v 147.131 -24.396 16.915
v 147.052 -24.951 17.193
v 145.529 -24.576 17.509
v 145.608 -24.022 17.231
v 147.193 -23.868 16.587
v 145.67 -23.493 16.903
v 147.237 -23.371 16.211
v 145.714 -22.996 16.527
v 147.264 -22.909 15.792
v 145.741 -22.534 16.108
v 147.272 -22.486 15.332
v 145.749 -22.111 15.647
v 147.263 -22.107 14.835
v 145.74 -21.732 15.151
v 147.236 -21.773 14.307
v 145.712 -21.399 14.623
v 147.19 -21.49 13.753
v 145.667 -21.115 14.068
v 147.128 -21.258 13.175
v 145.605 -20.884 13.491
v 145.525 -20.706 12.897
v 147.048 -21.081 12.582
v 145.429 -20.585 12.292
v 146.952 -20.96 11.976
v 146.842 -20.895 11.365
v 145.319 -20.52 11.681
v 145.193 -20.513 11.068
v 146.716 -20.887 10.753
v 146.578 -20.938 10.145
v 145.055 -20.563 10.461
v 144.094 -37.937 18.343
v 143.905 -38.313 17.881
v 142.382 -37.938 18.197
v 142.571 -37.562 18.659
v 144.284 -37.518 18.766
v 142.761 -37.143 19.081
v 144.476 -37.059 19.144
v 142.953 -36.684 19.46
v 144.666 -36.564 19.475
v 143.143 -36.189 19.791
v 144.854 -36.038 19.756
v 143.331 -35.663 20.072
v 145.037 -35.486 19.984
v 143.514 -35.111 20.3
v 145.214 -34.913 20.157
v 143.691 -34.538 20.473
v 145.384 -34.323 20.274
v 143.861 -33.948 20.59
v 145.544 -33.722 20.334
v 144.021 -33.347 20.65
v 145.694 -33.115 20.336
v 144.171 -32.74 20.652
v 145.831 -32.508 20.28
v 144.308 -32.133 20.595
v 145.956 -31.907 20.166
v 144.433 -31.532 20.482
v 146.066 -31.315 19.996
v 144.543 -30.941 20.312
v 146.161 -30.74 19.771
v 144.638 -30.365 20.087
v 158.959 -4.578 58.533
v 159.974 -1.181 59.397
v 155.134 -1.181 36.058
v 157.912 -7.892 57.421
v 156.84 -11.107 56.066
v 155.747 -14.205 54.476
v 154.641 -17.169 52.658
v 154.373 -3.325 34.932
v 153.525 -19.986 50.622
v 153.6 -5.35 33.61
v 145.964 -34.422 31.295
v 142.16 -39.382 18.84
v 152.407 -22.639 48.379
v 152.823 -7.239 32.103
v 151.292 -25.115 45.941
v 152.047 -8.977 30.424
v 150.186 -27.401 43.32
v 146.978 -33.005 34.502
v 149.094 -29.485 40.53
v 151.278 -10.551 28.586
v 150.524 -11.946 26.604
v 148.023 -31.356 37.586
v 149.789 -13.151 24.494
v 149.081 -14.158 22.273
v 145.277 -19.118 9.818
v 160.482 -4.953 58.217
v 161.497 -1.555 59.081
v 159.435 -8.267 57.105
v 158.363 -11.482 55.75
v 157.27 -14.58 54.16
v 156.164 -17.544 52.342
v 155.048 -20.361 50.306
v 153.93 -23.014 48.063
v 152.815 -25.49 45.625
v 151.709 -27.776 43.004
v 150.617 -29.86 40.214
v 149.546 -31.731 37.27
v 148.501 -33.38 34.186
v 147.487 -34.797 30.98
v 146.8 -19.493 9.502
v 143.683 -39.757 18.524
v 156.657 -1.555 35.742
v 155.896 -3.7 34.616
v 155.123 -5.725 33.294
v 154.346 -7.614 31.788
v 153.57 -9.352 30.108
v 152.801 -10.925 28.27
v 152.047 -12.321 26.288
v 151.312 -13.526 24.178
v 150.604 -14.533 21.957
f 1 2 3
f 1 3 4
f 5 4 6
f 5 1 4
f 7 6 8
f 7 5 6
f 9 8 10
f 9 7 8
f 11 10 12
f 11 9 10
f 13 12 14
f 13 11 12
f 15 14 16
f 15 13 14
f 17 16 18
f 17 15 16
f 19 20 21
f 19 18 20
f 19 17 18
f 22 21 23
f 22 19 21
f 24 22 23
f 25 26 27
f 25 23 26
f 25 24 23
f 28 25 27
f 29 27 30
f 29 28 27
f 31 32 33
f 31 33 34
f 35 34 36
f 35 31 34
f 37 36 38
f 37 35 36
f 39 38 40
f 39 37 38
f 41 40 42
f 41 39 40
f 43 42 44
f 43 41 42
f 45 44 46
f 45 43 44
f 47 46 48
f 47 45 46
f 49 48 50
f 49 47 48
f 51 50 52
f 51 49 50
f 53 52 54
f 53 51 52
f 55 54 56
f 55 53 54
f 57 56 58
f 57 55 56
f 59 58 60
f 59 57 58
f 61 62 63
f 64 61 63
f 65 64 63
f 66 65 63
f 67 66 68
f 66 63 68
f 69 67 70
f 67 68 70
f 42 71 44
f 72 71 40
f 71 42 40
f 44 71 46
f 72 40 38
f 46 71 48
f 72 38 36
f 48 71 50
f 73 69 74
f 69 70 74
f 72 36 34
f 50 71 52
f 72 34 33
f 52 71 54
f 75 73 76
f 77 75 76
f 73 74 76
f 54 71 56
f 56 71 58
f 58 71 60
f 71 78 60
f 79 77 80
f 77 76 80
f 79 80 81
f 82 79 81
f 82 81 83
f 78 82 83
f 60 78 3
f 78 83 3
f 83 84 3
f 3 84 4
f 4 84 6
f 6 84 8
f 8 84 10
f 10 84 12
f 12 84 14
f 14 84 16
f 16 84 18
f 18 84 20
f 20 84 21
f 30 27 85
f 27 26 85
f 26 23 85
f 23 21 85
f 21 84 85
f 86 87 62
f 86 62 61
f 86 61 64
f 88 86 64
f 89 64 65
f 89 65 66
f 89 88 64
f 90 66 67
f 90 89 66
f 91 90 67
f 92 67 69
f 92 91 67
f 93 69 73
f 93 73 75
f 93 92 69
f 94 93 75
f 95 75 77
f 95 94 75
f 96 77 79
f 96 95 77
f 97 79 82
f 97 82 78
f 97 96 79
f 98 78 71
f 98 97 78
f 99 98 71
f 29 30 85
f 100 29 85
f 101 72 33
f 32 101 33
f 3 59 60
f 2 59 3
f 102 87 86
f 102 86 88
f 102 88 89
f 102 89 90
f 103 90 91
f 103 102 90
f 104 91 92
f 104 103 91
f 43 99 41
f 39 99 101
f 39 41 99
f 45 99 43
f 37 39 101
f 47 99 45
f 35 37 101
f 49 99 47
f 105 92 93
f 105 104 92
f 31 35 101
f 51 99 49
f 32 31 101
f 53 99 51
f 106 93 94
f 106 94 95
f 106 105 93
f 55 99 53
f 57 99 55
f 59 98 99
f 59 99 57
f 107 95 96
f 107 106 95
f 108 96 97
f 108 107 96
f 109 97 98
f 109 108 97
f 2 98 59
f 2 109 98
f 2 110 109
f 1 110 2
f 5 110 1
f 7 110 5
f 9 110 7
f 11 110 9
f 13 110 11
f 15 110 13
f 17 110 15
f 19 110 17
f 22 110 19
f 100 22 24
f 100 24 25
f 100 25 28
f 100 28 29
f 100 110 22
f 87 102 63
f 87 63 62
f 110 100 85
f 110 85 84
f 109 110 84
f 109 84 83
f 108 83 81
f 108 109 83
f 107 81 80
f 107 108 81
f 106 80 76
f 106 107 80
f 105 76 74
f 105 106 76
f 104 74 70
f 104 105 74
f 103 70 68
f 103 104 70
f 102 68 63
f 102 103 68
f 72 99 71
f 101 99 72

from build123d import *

# Parameters (mm, degrees)
BOSS_EXTRUDE1_DEPTH = 5
CUT_EXTRUDE1_DEPTH  = 152.149714479
BOSS_EXTRUDE2_DEPTH = 1.6
CUT_EXTRUDE2_REACH  = 101.053
FILLET1_R           = 5
SKETCH8_R           = 0.9
CUT_EXTRUDE3_DEPTH  = 175.947714489
CHAMFER1_SIZE       = 1.1
CUT_EXTRUDE4_REACH  = 101.053


with BuildPart() as part:
    # Sketch3 → Boss-Extrude1 (new body)
    with BuildSketch(Plane(origin=(0, 0, 0), x_dir=(-1, 0, 0), z_dir=(0, 0.40673664307580104, 0.9135454576426005))):
        Polygon((-142.43706784, 45.295200471), (-137.485727496, 44.599334966), (-141.048558881, 19.248472407), (-145.999899225, 19.944337911), align=None)
    extrude(amount=-BOSS_EXTRUDE1_DEPTH)

    # Sketch4 → Cut-Extrude1 (cut, through all)
    with BuildSketch(Plane(origin=(-3.483639423, -22.644400664, 10.081936737), x_dir=(0.9902680687415713, -0.12714095420809696, 0.056606799890943936), z_dir=(-0.13917310096005903, -0.9046548960473729, 0.4027783100251033))):
        with BuildLine():
            Line((146.507886552, 0), (144.854753595, 0))
            ThreePointArc((144.854753595, 0), (145.65008791, -0.129885377), (146.362780386, -0.506045337))
            Line((146.362780386, -0.506045337), (146.507886552, 0))
        make_face()
        with BuildLine():
            Line((142.354753595, 0), (142.354753595, -2.5))
            ThreePointArc((142.354753595, -2.5), (143.086986642, -0.732233047), (144.854753595, 0))
            Line((144.854753595, 0), (142.354753595, 0))
        make_face()
        with BuildLine():
            Line((142.354753595, -5), (144.854753595, -5))
            ThreePointArc((144.854753595, -5), (143.086986642, -4.267766953), (142.354753595, -2.5))
            Line((142.354753595, -2.5), (142.354753595, -5))
        make_face()
        with BuildLine():
            Line((147.354753595, -5), (147.354753595, -2.851352087))
            Line((147.354753595, -2.851352087), (147.257907835, -3.18909339))
            ThreePointArc((147.257907835, -3.18909339), (146.359291153, -4.496588775), (144.854753595, -5))
            Line((144.854753595, -5), (147.354753595, -5))
        make_face()
    extrude(amount=-CUT_EXTRUDE1_DEPTH, mode=Mode.SUBTRACT)

    # 3DSketch1 → Boss-Extrude2 (add)
    with BuildSketch(Plane(origin=(145.903995961, -19.504867382, 5.193229142), x_dir=(0.26692941591244046, 0.317996421638383, 0.9097400522928664), z_dir=(-0.9519067631920917, 0.23432754207656112, 0.1973933058984336))):
        with BuildLine():
            Line((0, 0), (18.020194743, 0.750238039))
            ThreePointArc((18.020194743, 0.750238039), (27.757448286, 3.045703126), (35.949753791, 8.787601507))
            Line((35.949753791, 8.787601507), (61.336751154, 0))
            ThreePointArc((61.336751154, 0), (43.312353527, -17.691834348), (19.085081694, -24.827604243))
            Line((19.085081694, -24.827604243), (1.064886951, -25.577842282))
            Line((1.064886951, -25.577842282), (0, 0))
        make_face()
    extrude(amount=BOSS_EXTRUDE2_DEPTH)

    # SurfaceCut1
    split(bisect_by=Plane(origin=(0, 0, 0), x_dir=(1, 0, 0), z_dir=(0, 1, 0)), keep=Keep.BOTTOM)

    # Sketch7 → Cut-Extrude2 (cut, up to next)
    with BuildSketch(Plane(origin=(135.582383415, -33.375838772, -28.115206151), x_dir=(-0.1909616440160216, 0.05006214034989929, -0.9803200664162116), z_dir=(0.9519067631921003, -0.23432754207656978, -0.197393305898382)), mode=Mode.PRIVATE) as cut_extrude2_sk1:
        Polygon((-42.660506239, 14.950285755), (-33.555755259, 10.814646797), (-40.338203151, -4.11714481), (-49.44295413, 0.018494148), align=None)
    cut_extrude2_tool1 = extrude(cut_extrude2_sk1.sketch, amount=-CUT_EXTRUDE2_REACH, mode=Mode.PRIVATE) & part.part
    add(cut_extrude2_tool1.solids().sort_by_distance((144.804967, -30.194611, 12.58319))[0], mode=Mode.SUBTRACT)

    # Fillet1
    fillet1_edges = [part.edges().sort_by_distance(p)[0] for p in [
        (146.549435826, -20.809301178, 13.907118047),
        (144.26699697, -35.645641474, 20.512682331),
    ]]
    fillet(fillet1_edges, radius=FILLET1_R)

    # Sketch8 → Cut-Extrude3 (cut, through all)
    with BuildSketch(Plane(origin=(-3.483639423, -22.644400664, 10.081936737), x_dir=(-0.9902680687415713, 0.12714095420809696, -0.056606799890943936), z_dir=(-0.13917310096005903, -0.9046548960473729, 0.4027783100251033))):
        with Locations(Location((-144.854753595, 2.5, 0), (0, 0, 90))):
            Circle(SKETCH8_R)
    extrude(amount=-CUT_EXTRUDE3_DEPTH, mode=Mode.SUBTRACT)

    # Chamfer1
    chamfer1_edges = [part.edges().sort_by_distance(p)[0] for p in [
        (143.524229053, -18.552985548, 6.508903318),
        (139.961397668, -41.712150887, 16.820028055),
    ]]
    chamfer(chamfer1_edges, length=CHAMFER1_SIZE)

    # SurfaceCut2
    split(bisect_by=Plane(origin=(10.924807763, 14.246045613, 35.772021304), x_dir=(0.9620268384206857, -0.10098922508518503, -0.2535853674307606), z_dir=(0.27295487201788504, 0.355935558889345, 0.8937592045734856)), keep=Keep.TOP)

    # Sketch9 → Cut-Extrude4 (cut, up to next)
    with BuildSketch(Plane(origin=(135.582383415, -33.375838772, -28.115206151), x_dir=(-0.1916712747682247, 0.047183044012121235, -0.9803243763094306), z_dir=(0.9519067631920741, -0.23432754207660406, -0.19739330589846776)), mode=Mode.PRIVATE) as cut_extrude4_sk1:
        with BuildLine():
            Line((-38.146163081, 12.769409099), (-36.256196585, 16.96321723))
            Line((-36.256196585, 16.96321723), (-50.420150266, 23.346293676))
            ThreePointArc((-50.420150266, 23.346293676), (-58.601061454, 29.10441478), (-64.064181125, 37.485201734))
            Line((-64.064181125, 37.485201734), (-90.897397483, 38.789071088))
            ThreePointArc((-90.897397483, 38.789071088), (-80.762444903, 15.655488385), (-60.938224677, 0.006839726))
            Line((-60.938224677, 0.006839726), (-46.774270996, -6.37623672))
            Line((-46.774270996, -6.37623672), (-44.8843045, -2.182428588))
            ThreePointArc((-44.8843045, -2.182428588), (-47.505947759, 0.605338899), (-47.388480191, 4.43036992))
            Line((-47.388480191, 4.43036992), (-44.758961589, 10.265233407))
            ThreePointArc((-44.758961589, 10.265233407), (-41.971194102, 12.886876667), (-38.146163081, 12.769409099))
        make_face()
        with BuildLine():
            Line((-60.280845026, 1.465555598), (-47.575607217, -4.260141197))
            Line((-47.575607217, -4.260141197), (-46.919511198, -2.804273685))
            ThreePointArc((-46.919511198, -2.804273685), (-49.241503093, 0.809999924), (-48.847196063, 5.087749571))
            Line((-48.847196063, 5.087749571), (-46.217677461, 10.922613058))
            ThreePointArc((-46.217677461, 10.922613058), (-43.274123535, 14.051528264), (-39.028388127, 14.706013497))
            Line((-39.028388127, 14.706013497), (-38.372292108, 16.161881009))
            Line((-38.372292108, 16.161881009), (-51.077529917, 21.887577804))
            ThreePointArc((-51.077529917, 21.887577804), (-59.392005247, 27.626678002), (-65.139212663, 35.935551452))
            Line((-65.139212663, 35.935551452), (-88.946453277, 37.092383753))
            ThreePointArc((-88.946453277, 37.092383753), (-78.877215258, 15.848472994), (-60.280845026, 1.465555598))
        make_face(mode=Mode.SUBTRACT)
    cut_extrude4_tool1 = extrude(cut_extrude4_sk1.sketch, amount=-CUT_EXTRUDE4_REACH, mode=Mode.PRIVATE) & part.part
    add(cut_extrude4_tool1.solids().sort_by_distance((146.459786, -20.443408, 8.987614))[0], mode=Mode.SUBTRACT)


solid = part.part
